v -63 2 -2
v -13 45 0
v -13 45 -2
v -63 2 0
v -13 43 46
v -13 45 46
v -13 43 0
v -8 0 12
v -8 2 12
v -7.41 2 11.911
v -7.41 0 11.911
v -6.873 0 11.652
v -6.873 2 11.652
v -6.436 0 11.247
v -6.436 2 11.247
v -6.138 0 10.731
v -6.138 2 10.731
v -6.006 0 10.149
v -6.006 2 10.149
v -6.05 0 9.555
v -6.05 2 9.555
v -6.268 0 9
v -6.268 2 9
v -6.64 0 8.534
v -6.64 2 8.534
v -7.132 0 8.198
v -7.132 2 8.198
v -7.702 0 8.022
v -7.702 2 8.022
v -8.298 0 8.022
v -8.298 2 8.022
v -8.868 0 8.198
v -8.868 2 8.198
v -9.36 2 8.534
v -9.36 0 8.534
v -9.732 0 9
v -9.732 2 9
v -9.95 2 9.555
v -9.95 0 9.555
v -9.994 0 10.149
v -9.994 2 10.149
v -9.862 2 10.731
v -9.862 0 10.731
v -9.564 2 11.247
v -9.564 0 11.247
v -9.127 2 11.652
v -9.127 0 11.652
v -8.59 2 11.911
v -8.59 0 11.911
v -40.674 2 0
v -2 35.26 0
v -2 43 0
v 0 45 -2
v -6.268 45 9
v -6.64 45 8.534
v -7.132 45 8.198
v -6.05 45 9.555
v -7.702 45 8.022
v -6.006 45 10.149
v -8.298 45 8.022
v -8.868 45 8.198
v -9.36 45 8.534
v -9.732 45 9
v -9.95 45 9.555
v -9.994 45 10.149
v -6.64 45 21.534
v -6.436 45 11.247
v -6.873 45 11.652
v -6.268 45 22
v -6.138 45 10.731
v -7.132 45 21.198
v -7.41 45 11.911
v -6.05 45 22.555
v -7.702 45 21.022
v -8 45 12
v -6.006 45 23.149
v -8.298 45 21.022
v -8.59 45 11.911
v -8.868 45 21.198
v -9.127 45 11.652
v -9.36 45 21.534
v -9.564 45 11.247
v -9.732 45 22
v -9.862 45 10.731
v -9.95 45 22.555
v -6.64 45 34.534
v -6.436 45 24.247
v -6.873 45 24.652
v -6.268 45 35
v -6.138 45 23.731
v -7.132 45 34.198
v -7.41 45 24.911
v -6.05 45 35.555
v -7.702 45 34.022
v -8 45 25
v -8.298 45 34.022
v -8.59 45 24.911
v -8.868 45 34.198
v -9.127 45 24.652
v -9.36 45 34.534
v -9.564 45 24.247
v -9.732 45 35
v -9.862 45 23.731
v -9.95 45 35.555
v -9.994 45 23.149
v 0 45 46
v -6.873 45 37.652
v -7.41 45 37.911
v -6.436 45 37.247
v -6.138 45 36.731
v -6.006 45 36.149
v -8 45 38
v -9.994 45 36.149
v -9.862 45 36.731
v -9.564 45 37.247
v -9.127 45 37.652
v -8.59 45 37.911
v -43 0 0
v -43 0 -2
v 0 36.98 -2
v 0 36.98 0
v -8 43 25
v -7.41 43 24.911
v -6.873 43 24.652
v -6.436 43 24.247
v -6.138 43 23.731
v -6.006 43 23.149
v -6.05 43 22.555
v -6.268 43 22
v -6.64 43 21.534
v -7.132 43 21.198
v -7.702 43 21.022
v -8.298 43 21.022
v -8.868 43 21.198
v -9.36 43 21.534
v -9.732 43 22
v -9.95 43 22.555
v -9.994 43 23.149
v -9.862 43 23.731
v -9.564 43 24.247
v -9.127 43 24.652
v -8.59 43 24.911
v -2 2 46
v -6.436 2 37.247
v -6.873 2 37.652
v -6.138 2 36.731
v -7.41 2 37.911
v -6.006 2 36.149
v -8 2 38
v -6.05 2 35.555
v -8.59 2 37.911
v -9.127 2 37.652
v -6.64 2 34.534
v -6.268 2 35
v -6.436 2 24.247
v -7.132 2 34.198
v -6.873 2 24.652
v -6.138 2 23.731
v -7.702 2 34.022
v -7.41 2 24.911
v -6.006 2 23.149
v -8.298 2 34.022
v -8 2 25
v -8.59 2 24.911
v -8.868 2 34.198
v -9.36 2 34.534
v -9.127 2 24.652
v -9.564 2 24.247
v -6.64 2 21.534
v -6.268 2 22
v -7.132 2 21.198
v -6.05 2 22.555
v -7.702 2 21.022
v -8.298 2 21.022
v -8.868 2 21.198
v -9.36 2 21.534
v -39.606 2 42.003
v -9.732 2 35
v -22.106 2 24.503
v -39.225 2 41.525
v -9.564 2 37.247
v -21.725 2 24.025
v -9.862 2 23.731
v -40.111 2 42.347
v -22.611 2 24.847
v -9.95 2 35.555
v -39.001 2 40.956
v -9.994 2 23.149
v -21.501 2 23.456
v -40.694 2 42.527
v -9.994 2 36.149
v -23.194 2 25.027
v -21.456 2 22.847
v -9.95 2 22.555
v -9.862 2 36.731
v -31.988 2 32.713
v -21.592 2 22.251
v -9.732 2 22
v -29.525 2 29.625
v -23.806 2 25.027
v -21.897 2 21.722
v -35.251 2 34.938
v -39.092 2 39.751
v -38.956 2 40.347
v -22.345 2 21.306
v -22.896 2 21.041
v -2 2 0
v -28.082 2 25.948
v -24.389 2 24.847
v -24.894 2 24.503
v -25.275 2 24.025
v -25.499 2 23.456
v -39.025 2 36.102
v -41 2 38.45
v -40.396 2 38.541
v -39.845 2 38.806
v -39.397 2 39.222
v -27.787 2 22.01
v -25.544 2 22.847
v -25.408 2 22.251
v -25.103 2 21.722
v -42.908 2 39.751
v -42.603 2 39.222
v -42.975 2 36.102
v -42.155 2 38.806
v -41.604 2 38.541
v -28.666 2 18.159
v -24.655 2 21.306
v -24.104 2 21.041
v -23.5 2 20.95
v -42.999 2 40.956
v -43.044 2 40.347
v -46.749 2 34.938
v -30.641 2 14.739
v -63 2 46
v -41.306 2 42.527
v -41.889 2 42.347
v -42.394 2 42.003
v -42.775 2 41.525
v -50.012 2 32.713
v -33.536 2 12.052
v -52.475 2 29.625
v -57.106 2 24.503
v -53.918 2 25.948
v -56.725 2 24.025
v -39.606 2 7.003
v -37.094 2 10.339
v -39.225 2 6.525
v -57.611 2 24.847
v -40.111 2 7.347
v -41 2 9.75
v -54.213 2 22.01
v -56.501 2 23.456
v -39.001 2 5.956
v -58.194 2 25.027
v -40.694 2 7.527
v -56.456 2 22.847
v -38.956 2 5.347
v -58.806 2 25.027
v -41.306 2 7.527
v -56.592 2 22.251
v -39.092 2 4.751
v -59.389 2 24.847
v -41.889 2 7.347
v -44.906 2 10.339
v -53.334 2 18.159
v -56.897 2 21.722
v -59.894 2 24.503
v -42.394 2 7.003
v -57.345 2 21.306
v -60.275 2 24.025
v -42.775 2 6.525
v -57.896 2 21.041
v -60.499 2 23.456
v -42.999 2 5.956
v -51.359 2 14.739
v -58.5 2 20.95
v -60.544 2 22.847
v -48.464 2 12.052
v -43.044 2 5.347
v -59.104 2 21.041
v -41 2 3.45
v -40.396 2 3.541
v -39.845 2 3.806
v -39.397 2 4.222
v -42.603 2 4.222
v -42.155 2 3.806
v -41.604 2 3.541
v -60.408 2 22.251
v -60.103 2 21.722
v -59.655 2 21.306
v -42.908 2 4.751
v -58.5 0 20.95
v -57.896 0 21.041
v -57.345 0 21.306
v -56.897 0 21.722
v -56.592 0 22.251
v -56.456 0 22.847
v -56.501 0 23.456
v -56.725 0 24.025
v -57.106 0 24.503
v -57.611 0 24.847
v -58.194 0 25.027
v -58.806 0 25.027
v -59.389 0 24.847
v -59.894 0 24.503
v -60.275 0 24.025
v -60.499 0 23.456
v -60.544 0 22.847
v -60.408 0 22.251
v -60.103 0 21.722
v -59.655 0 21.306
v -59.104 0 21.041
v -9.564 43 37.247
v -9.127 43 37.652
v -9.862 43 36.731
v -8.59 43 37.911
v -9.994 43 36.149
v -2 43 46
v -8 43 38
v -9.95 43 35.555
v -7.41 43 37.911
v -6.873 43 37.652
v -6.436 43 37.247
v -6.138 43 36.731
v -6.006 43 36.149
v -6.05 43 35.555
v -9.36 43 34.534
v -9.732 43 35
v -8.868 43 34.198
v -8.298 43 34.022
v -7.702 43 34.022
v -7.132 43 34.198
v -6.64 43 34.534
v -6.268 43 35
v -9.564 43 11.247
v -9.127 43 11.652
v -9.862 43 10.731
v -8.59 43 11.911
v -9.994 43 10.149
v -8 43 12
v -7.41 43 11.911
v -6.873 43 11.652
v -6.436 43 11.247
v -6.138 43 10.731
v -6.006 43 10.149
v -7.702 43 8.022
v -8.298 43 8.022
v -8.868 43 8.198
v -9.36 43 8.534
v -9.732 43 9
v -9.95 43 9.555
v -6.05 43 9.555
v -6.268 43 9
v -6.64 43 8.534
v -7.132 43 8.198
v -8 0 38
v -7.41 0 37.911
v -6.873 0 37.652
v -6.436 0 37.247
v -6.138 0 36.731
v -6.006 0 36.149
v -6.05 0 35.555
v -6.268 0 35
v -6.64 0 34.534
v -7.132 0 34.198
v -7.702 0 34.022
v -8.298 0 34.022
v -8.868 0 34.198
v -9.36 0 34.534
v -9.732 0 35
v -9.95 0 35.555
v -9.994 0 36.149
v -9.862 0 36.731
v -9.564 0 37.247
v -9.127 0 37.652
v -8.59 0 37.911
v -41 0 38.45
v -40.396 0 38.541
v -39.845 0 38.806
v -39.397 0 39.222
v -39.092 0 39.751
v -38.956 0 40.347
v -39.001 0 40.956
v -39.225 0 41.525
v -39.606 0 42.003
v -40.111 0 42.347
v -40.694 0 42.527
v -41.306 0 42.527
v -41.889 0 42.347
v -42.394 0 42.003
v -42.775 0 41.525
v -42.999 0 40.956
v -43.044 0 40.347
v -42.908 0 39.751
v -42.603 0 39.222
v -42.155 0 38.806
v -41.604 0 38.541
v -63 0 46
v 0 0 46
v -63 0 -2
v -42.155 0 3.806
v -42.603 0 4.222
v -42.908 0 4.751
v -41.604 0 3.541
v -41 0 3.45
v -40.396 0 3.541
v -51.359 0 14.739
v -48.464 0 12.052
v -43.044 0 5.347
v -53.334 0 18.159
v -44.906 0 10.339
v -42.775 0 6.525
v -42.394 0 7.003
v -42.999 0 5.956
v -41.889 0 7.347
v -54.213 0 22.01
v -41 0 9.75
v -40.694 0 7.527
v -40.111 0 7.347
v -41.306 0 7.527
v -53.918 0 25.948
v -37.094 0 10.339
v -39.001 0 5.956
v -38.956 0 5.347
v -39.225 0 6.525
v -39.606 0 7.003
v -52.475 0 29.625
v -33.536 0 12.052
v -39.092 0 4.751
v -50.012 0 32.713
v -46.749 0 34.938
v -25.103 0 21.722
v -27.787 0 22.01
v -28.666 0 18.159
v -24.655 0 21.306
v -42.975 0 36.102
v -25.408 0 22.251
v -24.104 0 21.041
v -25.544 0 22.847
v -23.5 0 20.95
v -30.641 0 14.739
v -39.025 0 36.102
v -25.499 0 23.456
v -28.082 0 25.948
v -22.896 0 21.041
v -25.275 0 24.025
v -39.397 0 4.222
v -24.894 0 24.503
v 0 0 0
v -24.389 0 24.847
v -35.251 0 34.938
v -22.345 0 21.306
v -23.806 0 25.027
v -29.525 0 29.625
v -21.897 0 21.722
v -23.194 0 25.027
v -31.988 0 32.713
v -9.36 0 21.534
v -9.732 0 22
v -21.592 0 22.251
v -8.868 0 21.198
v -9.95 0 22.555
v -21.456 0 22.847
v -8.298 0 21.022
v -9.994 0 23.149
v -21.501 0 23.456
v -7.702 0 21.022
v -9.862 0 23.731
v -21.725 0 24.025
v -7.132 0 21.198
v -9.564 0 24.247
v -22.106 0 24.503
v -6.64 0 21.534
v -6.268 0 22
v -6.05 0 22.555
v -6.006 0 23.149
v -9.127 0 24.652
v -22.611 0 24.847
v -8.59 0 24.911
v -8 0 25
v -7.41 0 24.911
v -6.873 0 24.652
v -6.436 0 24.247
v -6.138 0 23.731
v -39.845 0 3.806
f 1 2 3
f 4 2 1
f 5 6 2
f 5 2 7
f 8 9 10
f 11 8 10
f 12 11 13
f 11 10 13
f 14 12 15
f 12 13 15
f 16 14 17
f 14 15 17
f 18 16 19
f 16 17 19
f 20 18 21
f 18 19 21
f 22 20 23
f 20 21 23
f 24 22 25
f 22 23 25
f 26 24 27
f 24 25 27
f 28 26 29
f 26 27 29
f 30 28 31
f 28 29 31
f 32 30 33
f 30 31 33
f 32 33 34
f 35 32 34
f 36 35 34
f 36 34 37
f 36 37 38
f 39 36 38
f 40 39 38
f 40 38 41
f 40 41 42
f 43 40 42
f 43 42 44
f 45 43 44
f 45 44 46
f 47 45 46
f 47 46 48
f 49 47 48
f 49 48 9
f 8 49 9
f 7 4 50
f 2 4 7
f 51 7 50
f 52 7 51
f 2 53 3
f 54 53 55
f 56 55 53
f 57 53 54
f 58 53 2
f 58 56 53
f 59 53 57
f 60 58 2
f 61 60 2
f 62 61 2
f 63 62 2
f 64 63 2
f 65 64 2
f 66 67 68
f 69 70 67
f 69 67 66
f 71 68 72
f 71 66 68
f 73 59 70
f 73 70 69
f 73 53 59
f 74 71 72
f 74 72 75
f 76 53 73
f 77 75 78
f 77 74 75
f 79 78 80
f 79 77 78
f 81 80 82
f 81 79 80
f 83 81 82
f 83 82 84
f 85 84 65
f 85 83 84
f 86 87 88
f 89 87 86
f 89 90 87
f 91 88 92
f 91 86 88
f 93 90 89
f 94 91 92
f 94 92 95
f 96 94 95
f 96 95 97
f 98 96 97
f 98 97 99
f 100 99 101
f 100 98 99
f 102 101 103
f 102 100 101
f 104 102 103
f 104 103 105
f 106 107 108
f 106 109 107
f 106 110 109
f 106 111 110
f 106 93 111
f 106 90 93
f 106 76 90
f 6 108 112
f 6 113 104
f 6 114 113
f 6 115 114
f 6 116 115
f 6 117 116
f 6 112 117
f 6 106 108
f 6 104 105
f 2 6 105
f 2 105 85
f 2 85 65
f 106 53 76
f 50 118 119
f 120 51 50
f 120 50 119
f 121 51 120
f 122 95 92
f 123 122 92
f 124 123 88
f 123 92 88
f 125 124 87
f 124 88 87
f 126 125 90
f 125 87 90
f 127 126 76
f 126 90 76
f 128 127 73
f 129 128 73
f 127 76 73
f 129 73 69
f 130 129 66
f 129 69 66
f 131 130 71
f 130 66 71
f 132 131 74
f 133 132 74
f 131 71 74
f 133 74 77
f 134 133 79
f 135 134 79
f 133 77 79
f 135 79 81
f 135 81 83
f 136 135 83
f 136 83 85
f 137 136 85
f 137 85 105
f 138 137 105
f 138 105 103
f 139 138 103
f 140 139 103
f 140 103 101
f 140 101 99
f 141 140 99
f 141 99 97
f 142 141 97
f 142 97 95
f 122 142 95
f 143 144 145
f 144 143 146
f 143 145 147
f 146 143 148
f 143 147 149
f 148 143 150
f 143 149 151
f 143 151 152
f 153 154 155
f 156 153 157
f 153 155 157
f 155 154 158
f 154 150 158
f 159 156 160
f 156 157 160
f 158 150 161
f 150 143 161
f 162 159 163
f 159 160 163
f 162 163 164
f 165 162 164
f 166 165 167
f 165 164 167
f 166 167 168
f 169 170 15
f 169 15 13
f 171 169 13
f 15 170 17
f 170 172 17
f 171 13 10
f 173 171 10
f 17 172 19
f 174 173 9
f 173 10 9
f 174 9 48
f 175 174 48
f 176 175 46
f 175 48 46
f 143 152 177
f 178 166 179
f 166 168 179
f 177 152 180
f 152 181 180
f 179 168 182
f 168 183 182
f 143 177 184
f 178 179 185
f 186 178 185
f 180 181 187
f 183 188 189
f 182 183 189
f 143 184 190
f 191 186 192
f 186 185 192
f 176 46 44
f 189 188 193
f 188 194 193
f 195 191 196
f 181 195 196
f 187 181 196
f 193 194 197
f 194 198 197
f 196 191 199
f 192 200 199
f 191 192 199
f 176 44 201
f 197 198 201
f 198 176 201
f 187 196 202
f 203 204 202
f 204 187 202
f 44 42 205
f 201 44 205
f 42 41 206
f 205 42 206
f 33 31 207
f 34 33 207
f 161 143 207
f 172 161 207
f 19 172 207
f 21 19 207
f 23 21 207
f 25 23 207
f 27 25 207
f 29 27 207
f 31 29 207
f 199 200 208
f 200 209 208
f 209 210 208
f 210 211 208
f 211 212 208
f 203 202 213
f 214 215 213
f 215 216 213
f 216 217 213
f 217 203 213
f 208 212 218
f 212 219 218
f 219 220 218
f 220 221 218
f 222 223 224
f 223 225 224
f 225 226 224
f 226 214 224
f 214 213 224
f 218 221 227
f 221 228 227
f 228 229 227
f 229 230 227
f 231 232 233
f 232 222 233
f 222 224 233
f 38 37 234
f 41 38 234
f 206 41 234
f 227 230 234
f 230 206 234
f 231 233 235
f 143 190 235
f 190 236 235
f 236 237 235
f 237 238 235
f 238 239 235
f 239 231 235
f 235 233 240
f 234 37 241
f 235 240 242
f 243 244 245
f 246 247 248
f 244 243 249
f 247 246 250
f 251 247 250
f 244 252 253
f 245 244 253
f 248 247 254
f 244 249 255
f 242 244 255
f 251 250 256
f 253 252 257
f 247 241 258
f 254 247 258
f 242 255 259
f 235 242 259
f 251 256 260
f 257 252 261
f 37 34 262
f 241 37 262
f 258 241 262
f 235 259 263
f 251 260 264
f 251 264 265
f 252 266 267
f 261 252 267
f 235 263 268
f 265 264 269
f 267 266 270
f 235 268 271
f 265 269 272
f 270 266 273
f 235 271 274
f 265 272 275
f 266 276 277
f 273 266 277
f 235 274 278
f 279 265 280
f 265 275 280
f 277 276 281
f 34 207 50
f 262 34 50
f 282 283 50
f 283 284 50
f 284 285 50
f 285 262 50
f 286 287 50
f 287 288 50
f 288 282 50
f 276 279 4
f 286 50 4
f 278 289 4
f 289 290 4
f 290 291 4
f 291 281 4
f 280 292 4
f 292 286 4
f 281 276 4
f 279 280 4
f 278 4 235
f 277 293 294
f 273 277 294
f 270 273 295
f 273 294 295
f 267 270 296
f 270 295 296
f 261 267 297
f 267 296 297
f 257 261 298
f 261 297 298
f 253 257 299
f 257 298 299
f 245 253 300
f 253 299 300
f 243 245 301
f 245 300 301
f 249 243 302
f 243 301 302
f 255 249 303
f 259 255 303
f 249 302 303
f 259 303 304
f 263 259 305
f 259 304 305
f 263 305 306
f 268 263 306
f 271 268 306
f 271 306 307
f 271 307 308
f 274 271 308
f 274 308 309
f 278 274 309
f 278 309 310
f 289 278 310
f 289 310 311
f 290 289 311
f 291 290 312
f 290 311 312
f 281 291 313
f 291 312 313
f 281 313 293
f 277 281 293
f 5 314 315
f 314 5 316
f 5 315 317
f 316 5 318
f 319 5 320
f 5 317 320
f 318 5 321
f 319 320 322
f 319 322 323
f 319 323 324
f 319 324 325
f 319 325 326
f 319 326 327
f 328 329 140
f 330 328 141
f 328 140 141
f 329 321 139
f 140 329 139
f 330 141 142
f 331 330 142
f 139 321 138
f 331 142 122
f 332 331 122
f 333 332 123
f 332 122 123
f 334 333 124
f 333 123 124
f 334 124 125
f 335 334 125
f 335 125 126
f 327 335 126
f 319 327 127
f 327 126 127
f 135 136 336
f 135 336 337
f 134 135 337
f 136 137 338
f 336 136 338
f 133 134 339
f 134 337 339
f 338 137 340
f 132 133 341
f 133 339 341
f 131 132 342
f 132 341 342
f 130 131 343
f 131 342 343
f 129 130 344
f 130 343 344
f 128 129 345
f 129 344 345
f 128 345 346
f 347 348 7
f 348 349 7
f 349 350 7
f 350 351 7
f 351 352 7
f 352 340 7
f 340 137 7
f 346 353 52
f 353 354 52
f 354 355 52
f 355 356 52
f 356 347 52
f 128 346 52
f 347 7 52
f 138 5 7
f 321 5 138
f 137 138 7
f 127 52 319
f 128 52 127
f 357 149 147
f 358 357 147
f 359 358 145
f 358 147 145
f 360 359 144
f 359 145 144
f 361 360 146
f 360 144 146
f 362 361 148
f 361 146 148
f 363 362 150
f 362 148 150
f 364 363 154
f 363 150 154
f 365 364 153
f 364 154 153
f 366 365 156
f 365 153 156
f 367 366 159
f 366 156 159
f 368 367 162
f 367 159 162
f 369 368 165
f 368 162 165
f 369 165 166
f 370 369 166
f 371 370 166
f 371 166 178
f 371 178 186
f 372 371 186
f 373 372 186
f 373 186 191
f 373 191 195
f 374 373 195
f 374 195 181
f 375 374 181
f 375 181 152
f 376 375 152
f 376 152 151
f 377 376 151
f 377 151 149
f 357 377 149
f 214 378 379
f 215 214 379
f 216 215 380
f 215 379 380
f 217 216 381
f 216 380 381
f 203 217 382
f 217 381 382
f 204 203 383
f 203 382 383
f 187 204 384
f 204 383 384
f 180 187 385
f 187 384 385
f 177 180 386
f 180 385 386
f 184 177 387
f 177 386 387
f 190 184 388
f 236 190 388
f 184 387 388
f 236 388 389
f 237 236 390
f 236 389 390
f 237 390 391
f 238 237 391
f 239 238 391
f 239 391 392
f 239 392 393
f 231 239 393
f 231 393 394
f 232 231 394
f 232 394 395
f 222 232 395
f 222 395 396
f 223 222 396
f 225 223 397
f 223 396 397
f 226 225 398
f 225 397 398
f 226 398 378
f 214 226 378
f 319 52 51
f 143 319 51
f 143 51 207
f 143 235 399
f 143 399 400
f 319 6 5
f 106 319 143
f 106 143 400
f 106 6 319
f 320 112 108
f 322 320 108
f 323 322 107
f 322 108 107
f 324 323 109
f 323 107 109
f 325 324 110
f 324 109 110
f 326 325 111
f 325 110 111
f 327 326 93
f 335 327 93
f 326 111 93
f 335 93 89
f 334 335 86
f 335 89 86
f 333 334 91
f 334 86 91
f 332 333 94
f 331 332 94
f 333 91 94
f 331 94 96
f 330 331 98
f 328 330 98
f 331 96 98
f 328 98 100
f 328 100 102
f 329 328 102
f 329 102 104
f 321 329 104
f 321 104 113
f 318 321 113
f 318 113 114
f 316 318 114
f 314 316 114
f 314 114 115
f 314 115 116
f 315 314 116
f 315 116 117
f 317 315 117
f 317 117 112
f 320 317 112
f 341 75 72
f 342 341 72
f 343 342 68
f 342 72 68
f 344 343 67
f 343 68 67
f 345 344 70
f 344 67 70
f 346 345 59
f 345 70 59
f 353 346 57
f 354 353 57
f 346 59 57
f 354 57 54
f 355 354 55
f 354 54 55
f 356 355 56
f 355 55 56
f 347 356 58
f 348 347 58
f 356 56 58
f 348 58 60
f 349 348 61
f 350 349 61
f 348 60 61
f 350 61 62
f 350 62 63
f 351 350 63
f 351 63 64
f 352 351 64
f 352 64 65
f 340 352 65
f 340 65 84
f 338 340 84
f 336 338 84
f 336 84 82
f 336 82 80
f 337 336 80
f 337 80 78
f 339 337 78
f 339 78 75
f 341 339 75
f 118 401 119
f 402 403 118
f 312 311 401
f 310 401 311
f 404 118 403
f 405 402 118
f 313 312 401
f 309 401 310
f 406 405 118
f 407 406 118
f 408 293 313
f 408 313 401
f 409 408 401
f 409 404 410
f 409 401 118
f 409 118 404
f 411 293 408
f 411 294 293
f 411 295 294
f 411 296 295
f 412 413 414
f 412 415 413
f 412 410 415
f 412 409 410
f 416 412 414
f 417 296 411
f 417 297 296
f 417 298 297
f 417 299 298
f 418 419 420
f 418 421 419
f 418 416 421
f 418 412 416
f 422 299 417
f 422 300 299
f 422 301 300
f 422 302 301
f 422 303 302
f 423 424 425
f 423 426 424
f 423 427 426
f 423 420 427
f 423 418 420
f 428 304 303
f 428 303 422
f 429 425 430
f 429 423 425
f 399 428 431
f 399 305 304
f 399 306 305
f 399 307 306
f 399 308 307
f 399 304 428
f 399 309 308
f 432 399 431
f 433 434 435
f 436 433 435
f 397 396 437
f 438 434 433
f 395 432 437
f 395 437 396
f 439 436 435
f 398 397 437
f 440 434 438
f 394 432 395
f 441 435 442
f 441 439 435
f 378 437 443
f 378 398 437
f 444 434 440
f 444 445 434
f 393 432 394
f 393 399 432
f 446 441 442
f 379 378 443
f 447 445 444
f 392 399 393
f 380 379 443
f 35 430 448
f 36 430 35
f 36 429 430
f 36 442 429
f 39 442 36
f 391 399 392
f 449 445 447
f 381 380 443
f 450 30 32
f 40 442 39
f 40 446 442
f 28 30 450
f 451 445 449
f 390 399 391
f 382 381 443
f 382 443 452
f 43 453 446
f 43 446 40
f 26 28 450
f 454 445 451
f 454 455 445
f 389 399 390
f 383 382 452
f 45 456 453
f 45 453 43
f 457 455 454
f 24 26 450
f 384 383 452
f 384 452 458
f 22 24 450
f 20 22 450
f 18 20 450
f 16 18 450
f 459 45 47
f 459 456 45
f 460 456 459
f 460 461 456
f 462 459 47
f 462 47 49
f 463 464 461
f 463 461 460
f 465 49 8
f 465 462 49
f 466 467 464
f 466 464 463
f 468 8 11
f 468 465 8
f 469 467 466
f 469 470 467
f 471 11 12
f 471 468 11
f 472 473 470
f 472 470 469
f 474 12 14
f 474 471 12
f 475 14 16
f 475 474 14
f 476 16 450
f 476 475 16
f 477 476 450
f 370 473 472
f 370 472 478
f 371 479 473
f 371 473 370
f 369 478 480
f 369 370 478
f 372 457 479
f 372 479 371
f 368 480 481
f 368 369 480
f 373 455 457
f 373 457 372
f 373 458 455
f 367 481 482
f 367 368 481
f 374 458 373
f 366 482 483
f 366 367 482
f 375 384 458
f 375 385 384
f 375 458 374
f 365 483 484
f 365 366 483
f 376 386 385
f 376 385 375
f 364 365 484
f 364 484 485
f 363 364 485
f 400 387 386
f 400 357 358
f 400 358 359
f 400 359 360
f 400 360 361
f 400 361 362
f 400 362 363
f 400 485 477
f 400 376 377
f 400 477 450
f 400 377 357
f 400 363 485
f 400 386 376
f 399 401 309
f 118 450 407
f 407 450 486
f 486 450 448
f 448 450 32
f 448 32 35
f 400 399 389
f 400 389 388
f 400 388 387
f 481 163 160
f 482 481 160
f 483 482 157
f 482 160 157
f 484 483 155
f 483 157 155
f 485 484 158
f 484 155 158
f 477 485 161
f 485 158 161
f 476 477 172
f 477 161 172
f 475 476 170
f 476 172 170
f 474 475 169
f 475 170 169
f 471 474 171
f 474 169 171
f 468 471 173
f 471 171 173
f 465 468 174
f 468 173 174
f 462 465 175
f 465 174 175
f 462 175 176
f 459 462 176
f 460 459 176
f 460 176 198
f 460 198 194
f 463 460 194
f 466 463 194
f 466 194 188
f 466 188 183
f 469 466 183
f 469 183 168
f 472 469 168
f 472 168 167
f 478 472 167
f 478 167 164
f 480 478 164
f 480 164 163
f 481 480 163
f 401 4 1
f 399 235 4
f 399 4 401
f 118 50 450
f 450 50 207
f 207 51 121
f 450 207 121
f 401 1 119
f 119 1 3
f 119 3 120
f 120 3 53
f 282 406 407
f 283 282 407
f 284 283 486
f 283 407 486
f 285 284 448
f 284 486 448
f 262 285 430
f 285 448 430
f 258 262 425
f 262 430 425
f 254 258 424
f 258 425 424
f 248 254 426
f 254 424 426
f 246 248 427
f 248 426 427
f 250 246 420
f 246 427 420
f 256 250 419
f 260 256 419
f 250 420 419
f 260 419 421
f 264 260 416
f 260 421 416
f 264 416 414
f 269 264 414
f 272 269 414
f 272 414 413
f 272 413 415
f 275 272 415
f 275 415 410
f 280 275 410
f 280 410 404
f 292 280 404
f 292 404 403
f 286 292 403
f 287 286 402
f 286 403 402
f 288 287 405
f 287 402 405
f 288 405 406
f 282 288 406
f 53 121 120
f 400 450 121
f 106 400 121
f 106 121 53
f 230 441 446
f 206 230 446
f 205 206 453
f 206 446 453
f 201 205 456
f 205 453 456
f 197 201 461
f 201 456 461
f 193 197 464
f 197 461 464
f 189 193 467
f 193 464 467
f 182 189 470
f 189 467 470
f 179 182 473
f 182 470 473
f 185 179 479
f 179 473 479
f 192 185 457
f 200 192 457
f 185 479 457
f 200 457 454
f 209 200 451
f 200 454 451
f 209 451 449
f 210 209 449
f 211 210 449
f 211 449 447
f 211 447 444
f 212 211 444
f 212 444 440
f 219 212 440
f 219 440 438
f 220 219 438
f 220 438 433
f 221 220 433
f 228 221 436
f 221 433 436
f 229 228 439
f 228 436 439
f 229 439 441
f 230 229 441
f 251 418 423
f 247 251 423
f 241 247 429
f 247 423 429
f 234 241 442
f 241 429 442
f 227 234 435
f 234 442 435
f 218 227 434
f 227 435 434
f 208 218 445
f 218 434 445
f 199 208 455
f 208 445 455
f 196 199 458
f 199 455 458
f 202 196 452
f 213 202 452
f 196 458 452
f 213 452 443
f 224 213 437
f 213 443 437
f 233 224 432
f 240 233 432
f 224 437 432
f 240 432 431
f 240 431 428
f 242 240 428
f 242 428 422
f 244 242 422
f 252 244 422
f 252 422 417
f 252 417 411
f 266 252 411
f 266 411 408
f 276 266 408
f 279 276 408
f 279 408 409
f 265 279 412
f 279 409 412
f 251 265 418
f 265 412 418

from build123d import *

# Parameters (mm, degrees)
BOSS_EXTRUDE1_DEPTH = 46
SKETCH2_R           = 13.25
SKETCH2_R_2         = 2.05
CUT_EXTRUDE1_DEPTH  = 2
SKETCH3_R           = 2
CUT_EXTRUDE2_DEPTH  = 100
BOSS_EXTRUDE2_DEPTH = 2


with BuildPart() as part:
    # Sketch1 → Boss-Extrude1 (new body)
    with BuildSketch(Plane.XY):
        Polygon((0, 0), (0, 45), (-13, 45), (-13, 43), (-2, 43), (-2, 2), (-63, 2), (-63, 0), align=None)
    extrude(amount=BOSS_EXTRUDE1_DEPTH)

    # Sketch2 → Cut-Extrude1 (cut)
    with BuildSketch(Plane.XZ):
        with Locations(Location((-41, 23, 0), (0, 0, 270))):
            Circle(SKETCH2_R)
        with Locations(Location((-41, 40.5, 0), (0, 0, 270))):
            Circle(SKETCH2_R_2)
        with Locations(Location((-58.5, 23, 0), (0, 0, 270))):
            Circle(SKETCH2_R_2)
        with Locations(Location((-23.5, 23, 0), (0, 0, 270))):
            Circle(SKETCH2_R_2)
        with Locations(Location((-41, 5.5, 0), (0, 0, 270))):
            Circle(SKETCH2_R_2)
    extrude(amount=-CUT_EXTRUDE1_DEPTH, mode=Mode.SUBTRACT)

    # Sketch3 → Cut-Extrude2 (cut)
    with BuildSketch(Plane(origin=(0, 45, 0), x_dir=(1, 0, 0), z_dir=(0, 1, 0))):
        with Locations(Location((-8, -10, 0), (0, 0, 270))):
            Circle(SKETCH3_R)
        with Locations(Location((-8, -23, 0), (0, 0, 270))):
            Circle(SKETCH3_R)
        with Locations(Location((-8, -36, 0), (0, 0, 270))):
            Circle(SKETCH3_R)
    extrude(amount=-CUT_EXTRUDE2_DEPTH, mode=Mode.SUBTRACT)

    # Sketch4 → Boss-Extrude2 (add)
    with BuildSketch(Plane(origin=(0, 0, 0), x_dir=(-1, 0, 0), z_dir=(0, 0, -1))):
        Polygon((13, 45), (63, 2), (63, 0), (43, 0), (0, 36.98), (0, 45), align=None)
    extrude(amount=BOSS_EXTRUDE2_DEPTH)


solid = part.part
